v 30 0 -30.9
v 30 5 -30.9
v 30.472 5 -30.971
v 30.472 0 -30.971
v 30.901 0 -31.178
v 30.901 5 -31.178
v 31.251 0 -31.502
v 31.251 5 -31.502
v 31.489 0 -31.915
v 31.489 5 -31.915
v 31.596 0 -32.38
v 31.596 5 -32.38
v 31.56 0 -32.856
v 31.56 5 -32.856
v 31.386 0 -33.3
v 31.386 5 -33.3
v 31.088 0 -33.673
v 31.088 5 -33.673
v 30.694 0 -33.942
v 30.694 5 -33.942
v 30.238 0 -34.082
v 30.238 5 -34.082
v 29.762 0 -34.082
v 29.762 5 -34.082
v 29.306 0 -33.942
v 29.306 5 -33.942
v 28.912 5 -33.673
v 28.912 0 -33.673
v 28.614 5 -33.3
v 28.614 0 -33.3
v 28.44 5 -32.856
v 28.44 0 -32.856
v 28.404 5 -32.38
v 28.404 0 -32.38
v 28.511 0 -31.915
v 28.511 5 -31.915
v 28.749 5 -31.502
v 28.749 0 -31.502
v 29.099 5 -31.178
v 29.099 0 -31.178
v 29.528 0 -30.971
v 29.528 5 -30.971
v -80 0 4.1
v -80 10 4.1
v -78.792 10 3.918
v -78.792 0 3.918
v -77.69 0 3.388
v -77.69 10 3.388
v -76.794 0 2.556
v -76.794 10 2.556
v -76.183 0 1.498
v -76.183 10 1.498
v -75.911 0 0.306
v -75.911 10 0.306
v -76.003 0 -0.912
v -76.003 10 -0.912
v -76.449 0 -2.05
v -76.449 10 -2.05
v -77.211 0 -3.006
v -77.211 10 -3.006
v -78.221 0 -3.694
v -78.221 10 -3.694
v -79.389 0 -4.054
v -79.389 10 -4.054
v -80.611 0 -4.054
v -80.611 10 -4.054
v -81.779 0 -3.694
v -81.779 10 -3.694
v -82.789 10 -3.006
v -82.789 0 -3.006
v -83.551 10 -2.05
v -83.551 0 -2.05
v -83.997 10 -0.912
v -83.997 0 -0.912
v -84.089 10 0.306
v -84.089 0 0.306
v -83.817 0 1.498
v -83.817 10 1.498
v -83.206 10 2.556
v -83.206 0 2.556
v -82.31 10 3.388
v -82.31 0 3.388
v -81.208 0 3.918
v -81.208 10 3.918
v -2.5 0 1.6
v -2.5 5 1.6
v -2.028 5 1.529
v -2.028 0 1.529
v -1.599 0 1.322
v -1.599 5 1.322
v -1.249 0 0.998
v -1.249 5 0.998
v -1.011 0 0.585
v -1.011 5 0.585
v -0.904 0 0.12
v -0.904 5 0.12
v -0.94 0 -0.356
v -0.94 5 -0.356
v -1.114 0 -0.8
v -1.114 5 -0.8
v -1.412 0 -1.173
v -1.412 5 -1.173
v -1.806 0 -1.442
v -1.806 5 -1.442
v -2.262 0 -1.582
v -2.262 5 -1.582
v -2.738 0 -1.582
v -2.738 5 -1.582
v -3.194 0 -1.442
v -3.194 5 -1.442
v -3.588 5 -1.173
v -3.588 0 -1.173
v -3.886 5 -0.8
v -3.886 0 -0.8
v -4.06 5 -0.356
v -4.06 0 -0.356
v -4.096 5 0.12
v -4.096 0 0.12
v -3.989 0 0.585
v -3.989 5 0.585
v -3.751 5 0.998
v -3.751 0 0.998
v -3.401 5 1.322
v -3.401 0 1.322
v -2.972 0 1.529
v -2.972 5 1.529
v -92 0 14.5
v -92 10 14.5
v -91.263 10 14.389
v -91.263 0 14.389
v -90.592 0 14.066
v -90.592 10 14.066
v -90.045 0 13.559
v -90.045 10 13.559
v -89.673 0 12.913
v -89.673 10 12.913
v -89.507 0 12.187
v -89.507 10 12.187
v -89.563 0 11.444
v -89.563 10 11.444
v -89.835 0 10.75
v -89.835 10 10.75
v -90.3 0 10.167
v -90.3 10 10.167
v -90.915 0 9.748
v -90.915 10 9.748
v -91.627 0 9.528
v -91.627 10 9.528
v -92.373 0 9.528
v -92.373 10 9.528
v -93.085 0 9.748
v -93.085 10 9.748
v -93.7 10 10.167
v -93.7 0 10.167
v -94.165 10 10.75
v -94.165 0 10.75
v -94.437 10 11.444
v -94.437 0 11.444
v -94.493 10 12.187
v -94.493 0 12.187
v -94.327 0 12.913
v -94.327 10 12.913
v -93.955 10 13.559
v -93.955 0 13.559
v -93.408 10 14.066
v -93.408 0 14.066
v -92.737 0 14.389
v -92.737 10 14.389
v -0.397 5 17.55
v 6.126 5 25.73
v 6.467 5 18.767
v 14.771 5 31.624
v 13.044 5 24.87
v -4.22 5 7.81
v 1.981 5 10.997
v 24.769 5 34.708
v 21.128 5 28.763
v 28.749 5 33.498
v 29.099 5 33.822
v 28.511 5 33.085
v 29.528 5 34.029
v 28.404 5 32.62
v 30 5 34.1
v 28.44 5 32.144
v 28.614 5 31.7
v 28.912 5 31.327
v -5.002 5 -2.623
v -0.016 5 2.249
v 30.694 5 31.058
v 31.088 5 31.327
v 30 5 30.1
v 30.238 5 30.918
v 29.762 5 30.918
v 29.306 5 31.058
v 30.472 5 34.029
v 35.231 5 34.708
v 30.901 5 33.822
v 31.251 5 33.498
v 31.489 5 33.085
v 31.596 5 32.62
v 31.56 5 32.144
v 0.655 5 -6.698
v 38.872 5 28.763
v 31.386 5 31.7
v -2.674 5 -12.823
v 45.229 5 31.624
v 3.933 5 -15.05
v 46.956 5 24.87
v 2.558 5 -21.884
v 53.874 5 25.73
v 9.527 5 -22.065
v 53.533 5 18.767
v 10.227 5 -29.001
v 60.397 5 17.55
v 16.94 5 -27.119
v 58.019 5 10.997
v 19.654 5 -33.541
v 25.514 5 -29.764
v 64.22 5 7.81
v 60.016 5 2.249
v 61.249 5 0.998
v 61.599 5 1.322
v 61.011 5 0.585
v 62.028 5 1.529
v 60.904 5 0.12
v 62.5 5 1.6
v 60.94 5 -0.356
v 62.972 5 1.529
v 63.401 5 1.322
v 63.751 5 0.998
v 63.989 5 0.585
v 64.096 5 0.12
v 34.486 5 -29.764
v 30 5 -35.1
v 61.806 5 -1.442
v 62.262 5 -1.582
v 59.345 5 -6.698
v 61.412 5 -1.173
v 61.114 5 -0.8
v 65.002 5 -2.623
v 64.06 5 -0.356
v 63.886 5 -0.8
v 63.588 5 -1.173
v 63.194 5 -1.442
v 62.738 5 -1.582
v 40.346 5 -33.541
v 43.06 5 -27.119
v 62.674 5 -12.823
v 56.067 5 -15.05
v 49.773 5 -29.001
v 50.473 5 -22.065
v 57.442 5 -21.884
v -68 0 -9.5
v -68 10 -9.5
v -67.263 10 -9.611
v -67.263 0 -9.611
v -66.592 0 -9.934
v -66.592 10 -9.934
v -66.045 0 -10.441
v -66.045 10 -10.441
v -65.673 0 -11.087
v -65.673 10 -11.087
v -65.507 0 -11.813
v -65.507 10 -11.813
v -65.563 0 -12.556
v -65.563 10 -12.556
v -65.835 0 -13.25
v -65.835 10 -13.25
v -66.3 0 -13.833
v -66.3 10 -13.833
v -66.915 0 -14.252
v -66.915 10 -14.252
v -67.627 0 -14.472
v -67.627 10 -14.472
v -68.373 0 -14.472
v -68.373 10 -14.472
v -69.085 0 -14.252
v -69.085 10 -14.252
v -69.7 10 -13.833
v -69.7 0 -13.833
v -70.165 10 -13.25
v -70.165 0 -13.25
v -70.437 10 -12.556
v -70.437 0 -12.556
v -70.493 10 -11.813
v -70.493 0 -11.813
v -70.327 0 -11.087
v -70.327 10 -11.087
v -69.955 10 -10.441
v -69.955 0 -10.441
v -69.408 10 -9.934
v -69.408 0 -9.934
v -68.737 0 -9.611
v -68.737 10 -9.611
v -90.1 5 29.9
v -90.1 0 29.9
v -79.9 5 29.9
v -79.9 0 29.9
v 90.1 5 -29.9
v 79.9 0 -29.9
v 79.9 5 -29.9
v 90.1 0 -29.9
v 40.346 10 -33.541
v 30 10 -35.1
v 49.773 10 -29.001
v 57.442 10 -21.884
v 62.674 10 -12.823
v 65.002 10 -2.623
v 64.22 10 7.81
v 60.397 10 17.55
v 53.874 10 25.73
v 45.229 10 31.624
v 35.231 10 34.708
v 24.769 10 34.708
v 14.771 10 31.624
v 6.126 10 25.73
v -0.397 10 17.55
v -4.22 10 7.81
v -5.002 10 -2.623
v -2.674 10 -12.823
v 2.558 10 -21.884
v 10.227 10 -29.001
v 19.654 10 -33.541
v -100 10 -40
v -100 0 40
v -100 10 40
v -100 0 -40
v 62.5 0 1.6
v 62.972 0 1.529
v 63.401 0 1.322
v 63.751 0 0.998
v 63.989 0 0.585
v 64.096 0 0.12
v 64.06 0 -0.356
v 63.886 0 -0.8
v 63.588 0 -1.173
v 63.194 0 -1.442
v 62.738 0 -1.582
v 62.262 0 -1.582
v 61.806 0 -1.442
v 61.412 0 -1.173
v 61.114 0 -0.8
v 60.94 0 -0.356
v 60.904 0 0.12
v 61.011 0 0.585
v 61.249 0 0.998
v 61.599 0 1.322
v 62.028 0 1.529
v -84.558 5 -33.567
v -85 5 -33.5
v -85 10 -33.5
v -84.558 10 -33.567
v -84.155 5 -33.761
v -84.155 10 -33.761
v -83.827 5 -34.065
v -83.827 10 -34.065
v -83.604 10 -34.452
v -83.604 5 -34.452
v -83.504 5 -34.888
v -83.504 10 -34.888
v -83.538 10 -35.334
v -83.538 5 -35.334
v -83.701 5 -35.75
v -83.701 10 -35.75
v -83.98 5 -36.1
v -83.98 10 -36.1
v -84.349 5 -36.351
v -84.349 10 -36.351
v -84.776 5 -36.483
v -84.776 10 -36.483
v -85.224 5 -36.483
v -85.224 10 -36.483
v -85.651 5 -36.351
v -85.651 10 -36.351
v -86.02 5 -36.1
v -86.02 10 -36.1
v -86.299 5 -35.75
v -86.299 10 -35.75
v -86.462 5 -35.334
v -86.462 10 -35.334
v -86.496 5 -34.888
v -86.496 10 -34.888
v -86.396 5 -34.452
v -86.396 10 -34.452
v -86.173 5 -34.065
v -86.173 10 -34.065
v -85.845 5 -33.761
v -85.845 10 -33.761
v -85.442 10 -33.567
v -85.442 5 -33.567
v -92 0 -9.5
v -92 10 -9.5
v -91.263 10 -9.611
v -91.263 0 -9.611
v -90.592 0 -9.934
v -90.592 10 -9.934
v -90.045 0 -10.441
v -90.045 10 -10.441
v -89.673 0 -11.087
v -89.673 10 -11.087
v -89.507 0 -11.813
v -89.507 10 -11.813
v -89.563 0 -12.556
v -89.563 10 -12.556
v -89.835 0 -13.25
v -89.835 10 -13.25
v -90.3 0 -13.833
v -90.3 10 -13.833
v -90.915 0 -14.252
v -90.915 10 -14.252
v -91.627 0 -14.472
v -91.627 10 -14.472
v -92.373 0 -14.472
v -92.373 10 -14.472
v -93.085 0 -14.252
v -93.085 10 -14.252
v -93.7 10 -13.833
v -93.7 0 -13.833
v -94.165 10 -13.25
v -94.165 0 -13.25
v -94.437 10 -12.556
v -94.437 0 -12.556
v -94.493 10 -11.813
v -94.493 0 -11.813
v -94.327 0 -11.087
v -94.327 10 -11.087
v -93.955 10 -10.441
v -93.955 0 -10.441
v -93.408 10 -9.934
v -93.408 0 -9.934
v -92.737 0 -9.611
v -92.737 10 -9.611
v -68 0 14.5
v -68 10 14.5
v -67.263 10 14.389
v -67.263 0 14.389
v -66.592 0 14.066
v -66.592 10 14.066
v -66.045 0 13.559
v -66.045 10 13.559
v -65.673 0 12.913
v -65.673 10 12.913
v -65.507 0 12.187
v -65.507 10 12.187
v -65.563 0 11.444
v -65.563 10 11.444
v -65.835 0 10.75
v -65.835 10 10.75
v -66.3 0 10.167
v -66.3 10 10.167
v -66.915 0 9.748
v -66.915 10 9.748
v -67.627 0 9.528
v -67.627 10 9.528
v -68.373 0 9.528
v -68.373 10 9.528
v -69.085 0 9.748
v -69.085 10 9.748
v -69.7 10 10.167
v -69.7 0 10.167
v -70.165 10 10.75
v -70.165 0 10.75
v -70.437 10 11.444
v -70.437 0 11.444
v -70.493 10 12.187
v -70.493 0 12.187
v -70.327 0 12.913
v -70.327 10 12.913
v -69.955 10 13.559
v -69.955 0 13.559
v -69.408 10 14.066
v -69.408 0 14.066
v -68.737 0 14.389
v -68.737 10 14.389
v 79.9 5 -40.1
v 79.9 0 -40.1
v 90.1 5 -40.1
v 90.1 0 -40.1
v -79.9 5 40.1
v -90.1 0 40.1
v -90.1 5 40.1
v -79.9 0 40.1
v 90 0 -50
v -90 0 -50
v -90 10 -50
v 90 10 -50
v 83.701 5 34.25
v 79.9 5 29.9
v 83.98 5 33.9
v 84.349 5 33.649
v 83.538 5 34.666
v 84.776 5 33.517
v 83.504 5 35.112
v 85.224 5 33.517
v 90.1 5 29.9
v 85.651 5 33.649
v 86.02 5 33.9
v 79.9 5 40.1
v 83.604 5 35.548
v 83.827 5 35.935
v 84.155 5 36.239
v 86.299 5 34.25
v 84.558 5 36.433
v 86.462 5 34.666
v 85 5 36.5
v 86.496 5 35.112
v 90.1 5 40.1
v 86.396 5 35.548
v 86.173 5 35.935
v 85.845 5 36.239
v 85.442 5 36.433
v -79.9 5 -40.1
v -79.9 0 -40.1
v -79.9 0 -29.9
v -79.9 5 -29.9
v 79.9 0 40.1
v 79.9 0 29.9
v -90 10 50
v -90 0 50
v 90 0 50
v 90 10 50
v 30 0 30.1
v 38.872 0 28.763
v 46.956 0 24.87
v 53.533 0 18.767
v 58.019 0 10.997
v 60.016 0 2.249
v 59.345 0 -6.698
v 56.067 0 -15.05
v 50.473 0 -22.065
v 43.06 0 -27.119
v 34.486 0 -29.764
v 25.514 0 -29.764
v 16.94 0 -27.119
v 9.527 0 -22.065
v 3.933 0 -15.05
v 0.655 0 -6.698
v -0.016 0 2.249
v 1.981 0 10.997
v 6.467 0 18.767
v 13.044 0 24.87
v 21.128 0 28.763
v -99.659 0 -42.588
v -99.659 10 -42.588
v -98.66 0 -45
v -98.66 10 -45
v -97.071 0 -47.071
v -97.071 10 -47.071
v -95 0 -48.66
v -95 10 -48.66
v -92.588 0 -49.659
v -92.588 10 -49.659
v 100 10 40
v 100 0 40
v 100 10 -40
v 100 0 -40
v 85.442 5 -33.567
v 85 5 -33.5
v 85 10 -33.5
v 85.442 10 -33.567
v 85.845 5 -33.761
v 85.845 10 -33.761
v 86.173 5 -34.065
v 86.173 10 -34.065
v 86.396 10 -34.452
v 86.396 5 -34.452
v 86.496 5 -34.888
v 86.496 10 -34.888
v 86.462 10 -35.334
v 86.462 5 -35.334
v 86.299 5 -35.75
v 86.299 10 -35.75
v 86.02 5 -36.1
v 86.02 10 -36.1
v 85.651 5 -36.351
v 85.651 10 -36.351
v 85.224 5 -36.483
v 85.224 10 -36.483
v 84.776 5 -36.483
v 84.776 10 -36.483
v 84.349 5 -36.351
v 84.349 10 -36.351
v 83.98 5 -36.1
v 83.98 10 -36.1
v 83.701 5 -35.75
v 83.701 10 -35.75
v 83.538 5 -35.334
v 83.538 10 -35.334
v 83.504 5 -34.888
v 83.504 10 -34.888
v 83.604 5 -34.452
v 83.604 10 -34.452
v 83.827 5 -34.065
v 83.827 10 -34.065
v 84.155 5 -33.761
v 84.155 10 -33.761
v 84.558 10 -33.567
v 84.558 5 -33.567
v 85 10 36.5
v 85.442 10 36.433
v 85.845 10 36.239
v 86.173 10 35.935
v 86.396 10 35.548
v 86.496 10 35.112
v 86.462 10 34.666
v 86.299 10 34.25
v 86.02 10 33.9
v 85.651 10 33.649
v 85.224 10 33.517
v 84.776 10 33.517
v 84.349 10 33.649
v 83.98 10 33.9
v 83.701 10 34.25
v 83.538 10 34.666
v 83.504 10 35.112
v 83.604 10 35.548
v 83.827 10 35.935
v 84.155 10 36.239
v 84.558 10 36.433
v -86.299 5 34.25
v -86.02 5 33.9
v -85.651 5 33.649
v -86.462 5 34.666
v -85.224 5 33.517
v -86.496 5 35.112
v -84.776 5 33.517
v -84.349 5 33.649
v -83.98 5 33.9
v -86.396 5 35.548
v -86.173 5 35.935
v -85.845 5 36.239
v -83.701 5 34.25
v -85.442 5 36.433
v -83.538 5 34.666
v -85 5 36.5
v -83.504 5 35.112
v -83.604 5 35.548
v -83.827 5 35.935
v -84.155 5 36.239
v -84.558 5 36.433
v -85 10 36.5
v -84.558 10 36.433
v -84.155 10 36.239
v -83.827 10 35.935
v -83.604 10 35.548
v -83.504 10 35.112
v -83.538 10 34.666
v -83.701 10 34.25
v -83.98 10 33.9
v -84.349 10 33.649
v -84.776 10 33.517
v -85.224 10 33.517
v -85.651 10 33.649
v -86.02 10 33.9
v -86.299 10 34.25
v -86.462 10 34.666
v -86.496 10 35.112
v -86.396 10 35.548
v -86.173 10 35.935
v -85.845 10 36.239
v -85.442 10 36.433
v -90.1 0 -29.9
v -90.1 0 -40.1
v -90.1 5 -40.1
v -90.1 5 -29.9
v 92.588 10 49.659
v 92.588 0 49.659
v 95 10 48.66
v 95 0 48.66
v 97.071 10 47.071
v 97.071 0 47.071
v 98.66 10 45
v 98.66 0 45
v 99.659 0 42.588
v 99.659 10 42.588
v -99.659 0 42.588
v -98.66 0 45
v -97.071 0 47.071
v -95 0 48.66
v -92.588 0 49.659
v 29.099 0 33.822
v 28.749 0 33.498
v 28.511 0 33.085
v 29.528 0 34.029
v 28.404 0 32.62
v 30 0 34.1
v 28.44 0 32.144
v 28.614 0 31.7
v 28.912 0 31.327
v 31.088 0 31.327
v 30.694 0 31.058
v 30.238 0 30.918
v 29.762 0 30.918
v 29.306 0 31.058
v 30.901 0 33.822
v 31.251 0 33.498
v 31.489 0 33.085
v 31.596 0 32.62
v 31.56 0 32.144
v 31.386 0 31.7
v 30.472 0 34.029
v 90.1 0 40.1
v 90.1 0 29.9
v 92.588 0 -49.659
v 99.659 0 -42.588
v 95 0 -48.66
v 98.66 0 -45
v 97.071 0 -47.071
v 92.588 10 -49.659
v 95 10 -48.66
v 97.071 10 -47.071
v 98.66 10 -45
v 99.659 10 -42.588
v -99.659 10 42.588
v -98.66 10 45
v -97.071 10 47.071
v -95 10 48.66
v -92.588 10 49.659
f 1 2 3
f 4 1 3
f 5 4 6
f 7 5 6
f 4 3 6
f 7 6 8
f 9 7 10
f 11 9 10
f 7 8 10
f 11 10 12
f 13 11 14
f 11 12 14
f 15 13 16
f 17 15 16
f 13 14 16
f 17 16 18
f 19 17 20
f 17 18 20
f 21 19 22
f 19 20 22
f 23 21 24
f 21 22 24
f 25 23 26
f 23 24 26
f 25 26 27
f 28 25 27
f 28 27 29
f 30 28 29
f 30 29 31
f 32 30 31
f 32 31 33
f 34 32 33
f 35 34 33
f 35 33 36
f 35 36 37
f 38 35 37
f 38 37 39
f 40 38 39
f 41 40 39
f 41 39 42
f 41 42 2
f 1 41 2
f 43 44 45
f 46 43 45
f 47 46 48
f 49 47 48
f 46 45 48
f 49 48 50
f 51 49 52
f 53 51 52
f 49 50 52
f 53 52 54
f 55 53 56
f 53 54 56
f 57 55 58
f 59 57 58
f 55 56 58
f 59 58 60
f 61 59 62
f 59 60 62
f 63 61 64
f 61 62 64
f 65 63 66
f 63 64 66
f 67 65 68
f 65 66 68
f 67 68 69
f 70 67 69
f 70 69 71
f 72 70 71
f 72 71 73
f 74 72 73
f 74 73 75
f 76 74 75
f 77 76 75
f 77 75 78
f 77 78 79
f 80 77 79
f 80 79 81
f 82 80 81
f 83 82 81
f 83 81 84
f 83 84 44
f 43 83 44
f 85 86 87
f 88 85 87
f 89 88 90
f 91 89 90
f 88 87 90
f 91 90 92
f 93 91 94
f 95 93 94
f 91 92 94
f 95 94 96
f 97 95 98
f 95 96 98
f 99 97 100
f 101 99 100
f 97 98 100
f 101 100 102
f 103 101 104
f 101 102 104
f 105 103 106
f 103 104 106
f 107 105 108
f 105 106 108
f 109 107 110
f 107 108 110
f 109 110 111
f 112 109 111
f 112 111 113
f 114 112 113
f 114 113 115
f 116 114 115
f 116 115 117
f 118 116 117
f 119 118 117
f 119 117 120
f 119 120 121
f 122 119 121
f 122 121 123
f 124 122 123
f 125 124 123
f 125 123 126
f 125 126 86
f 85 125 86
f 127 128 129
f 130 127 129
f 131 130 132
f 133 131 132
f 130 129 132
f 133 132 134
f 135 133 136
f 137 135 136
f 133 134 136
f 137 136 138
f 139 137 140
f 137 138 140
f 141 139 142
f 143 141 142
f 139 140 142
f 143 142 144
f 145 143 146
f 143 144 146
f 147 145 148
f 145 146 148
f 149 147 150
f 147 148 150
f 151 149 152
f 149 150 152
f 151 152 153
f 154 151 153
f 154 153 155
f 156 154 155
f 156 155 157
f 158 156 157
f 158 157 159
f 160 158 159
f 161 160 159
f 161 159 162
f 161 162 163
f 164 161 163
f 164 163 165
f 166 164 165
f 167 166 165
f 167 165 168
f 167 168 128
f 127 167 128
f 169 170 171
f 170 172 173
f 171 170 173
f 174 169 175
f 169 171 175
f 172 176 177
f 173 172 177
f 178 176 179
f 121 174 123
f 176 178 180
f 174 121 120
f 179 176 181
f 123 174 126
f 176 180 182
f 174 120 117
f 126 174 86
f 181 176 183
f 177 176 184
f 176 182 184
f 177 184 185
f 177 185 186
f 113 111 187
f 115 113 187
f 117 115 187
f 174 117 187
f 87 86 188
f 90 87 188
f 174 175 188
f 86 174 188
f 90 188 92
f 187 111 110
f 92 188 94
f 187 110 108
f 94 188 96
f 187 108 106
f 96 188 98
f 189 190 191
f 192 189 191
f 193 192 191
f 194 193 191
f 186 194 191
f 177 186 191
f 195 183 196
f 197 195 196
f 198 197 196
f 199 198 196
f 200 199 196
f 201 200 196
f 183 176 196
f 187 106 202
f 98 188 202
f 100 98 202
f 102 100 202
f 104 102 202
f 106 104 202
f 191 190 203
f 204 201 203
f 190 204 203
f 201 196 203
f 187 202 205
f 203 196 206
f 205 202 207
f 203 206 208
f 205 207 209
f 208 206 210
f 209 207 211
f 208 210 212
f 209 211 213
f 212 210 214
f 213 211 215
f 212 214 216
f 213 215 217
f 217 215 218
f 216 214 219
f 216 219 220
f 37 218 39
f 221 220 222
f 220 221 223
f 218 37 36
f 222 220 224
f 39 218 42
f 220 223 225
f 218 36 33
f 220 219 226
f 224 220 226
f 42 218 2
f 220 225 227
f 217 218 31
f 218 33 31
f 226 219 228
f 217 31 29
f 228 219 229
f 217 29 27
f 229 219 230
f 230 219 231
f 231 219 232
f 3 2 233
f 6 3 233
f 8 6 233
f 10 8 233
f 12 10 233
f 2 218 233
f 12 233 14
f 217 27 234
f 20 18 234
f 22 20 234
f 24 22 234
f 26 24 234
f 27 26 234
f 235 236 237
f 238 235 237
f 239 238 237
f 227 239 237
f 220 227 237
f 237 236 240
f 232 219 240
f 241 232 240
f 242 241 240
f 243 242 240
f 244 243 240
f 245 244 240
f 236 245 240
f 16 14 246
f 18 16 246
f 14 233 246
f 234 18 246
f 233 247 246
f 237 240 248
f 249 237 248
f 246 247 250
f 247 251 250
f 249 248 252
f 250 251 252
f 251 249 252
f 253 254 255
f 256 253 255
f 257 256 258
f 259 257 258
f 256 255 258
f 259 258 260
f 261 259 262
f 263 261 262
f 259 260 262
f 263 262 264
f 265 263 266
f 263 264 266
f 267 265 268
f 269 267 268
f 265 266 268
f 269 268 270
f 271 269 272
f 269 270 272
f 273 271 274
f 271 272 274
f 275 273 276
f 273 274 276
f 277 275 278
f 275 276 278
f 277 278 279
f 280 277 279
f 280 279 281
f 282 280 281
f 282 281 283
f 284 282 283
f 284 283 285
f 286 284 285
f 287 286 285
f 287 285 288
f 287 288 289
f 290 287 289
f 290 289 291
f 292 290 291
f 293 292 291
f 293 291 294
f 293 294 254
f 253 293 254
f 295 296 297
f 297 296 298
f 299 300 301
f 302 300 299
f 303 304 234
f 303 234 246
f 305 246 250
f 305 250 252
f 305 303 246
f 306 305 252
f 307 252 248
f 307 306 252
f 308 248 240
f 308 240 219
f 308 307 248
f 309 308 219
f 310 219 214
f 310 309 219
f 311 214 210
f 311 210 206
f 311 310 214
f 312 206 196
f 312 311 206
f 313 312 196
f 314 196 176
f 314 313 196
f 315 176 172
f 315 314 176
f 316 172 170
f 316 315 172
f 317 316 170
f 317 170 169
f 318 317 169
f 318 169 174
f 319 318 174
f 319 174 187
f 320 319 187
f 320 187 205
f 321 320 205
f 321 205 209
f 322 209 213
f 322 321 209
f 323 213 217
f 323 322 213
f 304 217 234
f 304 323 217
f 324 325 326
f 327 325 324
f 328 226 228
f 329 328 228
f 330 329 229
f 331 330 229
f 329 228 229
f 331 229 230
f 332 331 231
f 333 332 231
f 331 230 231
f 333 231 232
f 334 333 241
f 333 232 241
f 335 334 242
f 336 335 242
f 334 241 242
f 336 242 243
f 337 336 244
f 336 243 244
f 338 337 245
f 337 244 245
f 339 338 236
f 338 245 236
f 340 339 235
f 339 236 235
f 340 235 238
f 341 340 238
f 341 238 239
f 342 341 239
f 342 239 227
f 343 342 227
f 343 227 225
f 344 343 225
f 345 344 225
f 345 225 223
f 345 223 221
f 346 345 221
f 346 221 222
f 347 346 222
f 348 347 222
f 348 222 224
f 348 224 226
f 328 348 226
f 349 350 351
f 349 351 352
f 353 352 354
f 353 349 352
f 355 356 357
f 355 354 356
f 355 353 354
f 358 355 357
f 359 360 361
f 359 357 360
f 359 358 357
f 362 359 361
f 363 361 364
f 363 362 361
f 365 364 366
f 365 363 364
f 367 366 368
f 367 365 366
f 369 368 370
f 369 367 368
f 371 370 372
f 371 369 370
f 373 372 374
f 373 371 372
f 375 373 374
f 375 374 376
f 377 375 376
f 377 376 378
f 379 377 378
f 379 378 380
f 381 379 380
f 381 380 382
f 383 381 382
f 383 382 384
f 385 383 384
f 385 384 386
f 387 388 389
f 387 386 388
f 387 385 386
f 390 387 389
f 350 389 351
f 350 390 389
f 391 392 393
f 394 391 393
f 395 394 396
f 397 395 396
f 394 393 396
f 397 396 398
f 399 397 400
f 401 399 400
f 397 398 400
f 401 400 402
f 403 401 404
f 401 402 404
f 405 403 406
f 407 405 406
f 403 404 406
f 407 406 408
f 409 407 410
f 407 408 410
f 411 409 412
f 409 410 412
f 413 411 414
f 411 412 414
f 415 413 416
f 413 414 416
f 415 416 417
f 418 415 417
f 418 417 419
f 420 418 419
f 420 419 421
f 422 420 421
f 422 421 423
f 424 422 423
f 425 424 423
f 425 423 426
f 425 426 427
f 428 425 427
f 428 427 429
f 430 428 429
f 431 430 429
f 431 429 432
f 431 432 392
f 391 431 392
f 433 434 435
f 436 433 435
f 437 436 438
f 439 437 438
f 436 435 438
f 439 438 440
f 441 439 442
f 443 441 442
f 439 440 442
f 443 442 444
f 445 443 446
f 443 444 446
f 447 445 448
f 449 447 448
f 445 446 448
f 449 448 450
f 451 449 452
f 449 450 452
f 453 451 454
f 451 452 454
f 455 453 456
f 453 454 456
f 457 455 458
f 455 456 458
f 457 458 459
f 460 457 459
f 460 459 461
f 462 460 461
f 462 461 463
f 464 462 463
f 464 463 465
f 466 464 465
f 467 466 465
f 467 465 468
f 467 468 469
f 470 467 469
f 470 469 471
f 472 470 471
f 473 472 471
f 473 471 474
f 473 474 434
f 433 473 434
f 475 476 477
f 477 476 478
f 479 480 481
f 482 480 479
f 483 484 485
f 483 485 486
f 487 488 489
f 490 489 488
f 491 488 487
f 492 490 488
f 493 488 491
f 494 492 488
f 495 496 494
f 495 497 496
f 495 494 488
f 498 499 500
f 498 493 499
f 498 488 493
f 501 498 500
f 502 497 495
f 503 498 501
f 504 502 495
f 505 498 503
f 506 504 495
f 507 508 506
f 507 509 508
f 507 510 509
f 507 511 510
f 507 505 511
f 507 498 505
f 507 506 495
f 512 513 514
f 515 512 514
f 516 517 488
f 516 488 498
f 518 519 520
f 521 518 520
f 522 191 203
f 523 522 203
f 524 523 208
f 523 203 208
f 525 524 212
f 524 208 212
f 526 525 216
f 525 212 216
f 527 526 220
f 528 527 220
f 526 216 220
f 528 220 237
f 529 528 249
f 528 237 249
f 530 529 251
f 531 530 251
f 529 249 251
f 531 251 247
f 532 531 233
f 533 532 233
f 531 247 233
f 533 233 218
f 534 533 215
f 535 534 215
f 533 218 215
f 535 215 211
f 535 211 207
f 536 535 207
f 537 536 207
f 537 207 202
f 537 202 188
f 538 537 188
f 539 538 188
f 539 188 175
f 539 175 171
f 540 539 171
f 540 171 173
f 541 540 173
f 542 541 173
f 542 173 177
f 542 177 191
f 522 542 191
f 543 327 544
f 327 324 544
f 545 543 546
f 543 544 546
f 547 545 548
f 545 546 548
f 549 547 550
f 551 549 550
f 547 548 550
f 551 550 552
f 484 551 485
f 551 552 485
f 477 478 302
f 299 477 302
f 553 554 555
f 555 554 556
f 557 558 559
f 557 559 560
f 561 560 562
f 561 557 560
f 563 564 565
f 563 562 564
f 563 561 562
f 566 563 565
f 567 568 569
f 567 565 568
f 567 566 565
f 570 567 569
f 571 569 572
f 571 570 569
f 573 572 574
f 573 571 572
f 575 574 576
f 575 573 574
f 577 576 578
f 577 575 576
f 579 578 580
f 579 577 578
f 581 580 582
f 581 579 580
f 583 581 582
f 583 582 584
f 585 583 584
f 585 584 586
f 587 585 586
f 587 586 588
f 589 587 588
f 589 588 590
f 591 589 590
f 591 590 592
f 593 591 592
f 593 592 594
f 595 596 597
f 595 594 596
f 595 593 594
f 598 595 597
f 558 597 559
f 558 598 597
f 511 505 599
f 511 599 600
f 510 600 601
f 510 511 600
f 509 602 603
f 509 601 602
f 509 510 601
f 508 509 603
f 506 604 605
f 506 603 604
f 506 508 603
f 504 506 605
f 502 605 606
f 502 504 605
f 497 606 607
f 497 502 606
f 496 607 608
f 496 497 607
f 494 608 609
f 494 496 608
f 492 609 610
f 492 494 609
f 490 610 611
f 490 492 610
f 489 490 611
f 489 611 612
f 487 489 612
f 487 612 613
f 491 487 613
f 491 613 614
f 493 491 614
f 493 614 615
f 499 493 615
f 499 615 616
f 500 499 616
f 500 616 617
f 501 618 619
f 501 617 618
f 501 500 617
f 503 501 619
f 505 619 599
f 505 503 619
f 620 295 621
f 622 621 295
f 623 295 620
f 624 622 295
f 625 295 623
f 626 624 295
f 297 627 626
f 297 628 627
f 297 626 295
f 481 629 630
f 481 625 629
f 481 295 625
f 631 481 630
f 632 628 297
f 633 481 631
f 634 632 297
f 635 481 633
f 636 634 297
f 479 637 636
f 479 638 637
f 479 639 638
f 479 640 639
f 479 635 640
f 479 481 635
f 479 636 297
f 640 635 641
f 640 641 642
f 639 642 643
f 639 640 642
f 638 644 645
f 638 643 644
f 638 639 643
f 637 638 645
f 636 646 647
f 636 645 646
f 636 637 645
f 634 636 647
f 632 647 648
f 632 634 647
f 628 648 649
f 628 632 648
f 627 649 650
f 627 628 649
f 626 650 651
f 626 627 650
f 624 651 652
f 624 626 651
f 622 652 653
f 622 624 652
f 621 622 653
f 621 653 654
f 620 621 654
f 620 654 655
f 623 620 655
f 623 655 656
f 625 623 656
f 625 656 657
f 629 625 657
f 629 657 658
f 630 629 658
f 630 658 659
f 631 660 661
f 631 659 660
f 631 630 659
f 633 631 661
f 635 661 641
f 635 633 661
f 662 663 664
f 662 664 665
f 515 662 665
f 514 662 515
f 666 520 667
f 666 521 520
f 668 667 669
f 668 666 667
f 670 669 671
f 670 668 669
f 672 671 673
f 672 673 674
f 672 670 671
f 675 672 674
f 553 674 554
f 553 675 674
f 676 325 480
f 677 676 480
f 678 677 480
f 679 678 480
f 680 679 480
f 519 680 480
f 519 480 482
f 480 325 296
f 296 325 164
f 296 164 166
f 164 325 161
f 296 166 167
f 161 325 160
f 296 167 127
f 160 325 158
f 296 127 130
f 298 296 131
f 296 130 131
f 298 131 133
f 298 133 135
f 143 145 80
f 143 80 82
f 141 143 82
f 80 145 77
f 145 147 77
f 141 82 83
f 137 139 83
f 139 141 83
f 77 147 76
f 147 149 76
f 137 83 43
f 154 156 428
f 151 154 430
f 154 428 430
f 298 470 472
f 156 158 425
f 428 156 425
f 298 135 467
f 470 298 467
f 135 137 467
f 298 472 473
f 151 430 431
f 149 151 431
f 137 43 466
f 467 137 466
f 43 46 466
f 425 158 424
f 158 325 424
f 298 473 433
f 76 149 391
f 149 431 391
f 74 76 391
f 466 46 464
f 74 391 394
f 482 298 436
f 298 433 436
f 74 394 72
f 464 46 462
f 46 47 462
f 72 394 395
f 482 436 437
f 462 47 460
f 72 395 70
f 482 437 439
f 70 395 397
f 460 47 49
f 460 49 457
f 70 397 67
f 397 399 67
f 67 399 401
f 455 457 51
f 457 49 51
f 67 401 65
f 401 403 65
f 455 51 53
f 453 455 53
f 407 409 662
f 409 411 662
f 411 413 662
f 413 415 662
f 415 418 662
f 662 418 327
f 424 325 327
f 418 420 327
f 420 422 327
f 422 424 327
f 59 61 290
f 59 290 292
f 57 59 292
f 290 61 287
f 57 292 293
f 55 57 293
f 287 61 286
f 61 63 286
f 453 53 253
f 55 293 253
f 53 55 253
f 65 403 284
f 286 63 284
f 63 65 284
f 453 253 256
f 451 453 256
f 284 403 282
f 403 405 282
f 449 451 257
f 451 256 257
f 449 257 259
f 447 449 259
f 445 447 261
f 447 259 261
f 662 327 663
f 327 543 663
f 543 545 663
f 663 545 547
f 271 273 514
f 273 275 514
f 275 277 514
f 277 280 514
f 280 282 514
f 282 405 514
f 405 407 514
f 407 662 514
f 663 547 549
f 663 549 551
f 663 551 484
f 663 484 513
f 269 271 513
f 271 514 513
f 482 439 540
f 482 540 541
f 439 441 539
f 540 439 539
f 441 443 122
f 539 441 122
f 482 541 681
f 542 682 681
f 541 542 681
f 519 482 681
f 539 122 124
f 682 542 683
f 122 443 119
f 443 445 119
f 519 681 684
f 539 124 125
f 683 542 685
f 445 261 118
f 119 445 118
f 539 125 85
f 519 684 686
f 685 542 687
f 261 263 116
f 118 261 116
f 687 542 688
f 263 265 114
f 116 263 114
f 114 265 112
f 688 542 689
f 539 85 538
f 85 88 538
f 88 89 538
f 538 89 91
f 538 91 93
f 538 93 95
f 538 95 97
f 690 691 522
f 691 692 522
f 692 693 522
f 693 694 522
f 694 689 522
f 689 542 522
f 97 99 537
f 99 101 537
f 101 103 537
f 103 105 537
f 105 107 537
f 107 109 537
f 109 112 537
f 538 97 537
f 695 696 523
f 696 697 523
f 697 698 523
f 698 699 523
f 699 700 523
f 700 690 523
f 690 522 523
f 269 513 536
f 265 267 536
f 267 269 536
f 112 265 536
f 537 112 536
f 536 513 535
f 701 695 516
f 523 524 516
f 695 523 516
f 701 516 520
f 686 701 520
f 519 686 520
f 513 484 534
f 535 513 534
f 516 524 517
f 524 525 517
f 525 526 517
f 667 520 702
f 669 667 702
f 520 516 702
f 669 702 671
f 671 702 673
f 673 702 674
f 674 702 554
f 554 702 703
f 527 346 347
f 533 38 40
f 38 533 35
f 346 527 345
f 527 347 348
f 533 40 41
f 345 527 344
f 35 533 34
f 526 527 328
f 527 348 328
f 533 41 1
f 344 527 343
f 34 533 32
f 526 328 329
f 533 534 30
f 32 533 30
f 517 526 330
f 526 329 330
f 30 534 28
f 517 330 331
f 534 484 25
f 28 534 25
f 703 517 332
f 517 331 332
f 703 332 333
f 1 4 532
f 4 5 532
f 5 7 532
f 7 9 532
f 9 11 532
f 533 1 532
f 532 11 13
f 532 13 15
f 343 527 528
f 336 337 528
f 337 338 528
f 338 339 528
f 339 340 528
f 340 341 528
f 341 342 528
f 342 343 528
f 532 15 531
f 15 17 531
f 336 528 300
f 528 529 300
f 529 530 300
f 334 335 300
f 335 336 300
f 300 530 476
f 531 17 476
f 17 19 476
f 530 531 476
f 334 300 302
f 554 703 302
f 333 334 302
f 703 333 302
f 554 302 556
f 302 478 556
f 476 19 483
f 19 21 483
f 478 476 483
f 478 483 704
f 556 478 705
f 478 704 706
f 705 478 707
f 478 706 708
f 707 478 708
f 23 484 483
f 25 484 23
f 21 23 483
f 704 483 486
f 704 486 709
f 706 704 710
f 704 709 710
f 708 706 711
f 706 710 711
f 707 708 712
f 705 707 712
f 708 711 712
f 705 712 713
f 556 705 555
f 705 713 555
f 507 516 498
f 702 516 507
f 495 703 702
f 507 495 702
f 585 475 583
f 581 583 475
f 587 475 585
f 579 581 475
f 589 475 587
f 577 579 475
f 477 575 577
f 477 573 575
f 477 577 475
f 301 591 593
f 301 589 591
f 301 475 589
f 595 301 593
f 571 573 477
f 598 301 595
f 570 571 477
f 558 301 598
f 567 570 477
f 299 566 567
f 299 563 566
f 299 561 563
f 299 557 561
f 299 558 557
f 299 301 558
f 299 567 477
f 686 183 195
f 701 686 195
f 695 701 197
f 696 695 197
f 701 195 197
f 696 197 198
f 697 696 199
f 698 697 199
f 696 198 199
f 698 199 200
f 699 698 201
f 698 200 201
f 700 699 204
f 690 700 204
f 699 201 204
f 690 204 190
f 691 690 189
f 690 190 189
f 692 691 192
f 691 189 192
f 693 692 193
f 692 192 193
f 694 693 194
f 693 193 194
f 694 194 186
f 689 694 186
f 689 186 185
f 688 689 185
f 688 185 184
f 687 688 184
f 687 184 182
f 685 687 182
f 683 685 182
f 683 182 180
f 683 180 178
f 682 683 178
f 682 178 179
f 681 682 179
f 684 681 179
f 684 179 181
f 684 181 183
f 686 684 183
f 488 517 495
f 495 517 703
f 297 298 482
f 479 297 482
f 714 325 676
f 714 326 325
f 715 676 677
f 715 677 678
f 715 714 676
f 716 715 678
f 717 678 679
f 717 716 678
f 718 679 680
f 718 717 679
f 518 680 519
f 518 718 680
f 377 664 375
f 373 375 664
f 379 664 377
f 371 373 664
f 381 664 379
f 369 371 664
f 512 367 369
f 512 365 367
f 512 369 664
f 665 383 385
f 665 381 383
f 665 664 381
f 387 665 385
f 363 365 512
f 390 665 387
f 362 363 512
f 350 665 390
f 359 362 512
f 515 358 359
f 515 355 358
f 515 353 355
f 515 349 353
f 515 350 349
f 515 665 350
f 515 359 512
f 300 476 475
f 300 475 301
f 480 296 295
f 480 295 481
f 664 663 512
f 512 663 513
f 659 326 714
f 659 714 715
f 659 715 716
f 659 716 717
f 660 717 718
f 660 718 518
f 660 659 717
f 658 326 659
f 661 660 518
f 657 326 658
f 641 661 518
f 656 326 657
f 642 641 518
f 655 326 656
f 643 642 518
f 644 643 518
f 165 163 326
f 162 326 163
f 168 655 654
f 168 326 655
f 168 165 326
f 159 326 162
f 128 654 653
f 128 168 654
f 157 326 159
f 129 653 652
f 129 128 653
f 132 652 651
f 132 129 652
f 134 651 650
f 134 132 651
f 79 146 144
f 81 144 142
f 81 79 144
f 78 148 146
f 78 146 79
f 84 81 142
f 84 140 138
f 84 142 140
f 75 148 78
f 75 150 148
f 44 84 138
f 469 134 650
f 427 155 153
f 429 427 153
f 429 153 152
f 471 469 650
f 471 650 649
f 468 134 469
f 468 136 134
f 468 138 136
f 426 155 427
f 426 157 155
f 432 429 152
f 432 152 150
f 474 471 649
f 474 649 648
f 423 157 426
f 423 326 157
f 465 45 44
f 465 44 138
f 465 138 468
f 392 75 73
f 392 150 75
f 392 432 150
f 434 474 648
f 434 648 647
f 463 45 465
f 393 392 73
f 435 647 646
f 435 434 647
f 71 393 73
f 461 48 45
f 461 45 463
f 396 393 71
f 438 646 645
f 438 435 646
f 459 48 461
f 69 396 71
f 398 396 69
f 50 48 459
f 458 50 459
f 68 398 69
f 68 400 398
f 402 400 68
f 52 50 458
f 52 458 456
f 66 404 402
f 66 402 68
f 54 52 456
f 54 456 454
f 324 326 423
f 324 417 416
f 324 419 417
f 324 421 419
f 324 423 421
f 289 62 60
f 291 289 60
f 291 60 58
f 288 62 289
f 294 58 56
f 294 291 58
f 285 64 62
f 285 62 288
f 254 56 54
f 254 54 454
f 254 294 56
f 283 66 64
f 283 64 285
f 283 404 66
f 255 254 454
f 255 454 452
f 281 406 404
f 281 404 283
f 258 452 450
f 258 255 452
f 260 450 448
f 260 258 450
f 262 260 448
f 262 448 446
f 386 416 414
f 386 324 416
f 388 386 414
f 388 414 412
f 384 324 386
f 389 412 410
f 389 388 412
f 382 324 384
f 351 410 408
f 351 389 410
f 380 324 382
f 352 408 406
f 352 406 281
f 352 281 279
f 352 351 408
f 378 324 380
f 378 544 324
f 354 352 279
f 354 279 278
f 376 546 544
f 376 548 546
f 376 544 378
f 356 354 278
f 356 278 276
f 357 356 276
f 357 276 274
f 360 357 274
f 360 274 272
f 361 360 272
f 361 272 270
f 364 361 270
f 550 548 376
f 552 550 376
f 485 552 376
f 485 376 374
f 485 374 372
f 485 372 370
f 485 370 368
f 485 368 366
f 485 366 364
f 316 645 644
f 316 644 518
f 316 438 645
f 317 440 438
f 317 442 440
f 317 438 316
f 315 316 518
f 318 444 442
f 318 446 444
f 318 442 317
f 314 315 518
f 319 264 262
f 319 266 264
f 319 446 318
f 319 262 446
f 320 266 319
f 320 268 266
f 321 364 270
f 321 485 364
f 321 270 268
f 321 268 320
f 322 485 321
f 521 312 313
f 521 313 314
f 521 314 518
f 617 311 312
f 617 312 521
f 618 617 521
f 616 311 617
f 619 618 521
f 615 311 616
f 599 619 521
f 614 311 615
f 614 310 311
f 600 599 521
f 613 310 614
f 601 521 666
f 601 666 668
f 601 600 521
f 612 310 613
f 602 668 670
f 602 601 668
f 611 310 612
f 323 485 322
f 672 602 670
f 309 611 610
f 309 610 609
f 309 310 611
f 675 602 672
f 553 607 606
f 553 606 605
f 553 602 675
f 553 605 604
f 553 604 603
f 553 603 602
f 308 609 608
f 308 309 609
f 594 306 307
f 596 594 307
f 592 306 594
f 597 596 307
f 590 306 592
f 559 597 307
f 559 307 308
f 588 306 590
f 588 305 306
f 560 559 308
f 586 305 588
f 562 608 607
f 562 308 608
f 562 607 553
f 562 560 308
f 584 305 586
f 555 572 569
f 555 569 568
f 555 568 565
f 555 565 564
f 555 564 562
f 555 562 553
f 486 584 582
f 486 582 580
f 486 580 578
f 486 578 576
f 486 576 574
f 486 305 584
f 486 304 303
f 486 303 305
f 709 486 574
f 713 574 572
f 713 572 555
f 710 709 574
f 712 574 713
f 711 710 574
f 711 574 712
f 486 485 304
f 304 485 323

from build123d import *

# Parameters (mm, degrees)
SKETCH_1_W          = 200
SKETCH_1_H          = 100
EXTRUDE_1_DEPTH     = 10
SKETCH_2_R          = 2.5
SKETCH_2_R_2        = 30.1
SKETCH_2_R_3        = 4.1
CUT_EXTRUDE_1_DEPTH = 113.249721603
SKETCH_3_R          = 35.1
CUT_EXTRUDE_2_DEPTH = 5
FILLET_1_R          = 10
SKETCH_4_W          = 10.2
SKETCH_4_H          = 10.2
CUT_EXTRUDE_4_DEPTH = 5
SKETCH_5_R          = 1.6
CUT_EXTRUDE_5_DEPTH = 112.915146428
SKETCH_6_R          = 1.5
CUT_EXTRUDE_7_DEPTH = 113.249721603


with BuildPart() as part:
    # ｽｹｯﾁ1 → ﾎﾞｽ - 押し出し1 (new body)
    with BuildSketch(Plane(origin=(0, 0, 0), x_dir=(1, 0, 0), z_dir=(0, 1, 0))):
        Rectangle(SKETCH_1_W, SKETCH_1_H)
    extrude(amount=EXTRUDE_1_DEPTH)

    # ｽｹｯﾁ2 → ｶｯﾄ - 押し出し1 (cut, through all)
    with BuildSketch(Plane(origin=(0, 10, 0), x_dir=(1, 0, 0), z_dir=(0, 1, 0))):
        with Locations((-92, 12)):
            Circle(SKETCH_2_R)
        with Locations((-68, 12)):
            Circle(SKETCH_2_R)
        with Locations((-92, -12)):
            Circle(SKETCH_2_R)
        with Locations((-68, -12)):
            Circle(SKETCH_2_R)
        with Locations((30, 0)):
            Circle(SKETCH_2_R_2)
        with Locations((-80, 0)):
            Circle(SKETCH_2_R_3)
    extrude(amount=-CUT_EXTRUDE_1_DEPTH, mode=Mode.SUBTRACT)

    # ｽｹｯﾁ3 → ｶｯﾄ - 押し出し2 (cut)
    with BuildSketch(Plane.XZ.offset(-10)):
        with Locations((30, 0)):
            Circle(SKETCH_3_R)
    extrude(amount=CUT_EXTRUDE_2_DEPTH, mode=Mode.SUBTRACT)

    # ﾌｨﾚｯﾄ1
    fillet_1_edges = [part.edges().sort_by_distance(p)[0] for p in [
        (100, 5, -50),
        (-100, 5, -50),
        (100, 5, 50),
        (-100, 5, 50),
    ]]
    fillet(fillet_1_edges, radius=FILLET_1_R)

    # ｽｹｯﾁ4 → ｶｯﾄ - 押し出し4 (cut)
    with BuildSketch(Plane.XZ):
        with Locations((-85, 35)):
            Rectangle(SKETCH_4_W, SKETCH_4_H)
        with Locations((-85, -35)):
            Rectangle(SKETCH_4_W, SKETCH_4_H)
        with Locations((85, 35)):
            Rectangle(SKETCH_4_W, SKETCH_4_H)
        with Locations((85, -35)):
            Rectangle(SKETCH_4_W, SKETCH_4_H)
    extrude(amount=-CUT_EXTRUDE_4_DEPTH, mode=Mode.SUBTRACT)

    # ｽｹｯﾁ5 → ｶｯﾄ - 押し出し5 (cut, through all)
    with BuildSketch(Plane(origin=(0, 5, 0), x_dir=(1, 0, 0), z_dir=(0, 1, 0))):
        with Locations((-2.5, 0)):
            Circle(SKETCH_5_R)
        with Locations((62.5, 0)):
            Circle(SKETCH_5_R)
        with Locations((30, 32.5)):
            Circle(SKETCH_5_R)
        with Locations((30, -32.5)):
            Circle(SKETCH_5_R)
    extrude(amount=-CUT_EXTRUDE_5_DEPTH, mode=Mode.SUBTRACT)

    # ｽｹｯﾁ6 → ｶｯﾄ - 押し出し7 (cut, through all)
    with BuildSketch(Plane(origin=(0, 0, 0), x_dir=(1, 0, 0), z_dir=(0, 1, 0))):
        with Locations((-85, -35)):
            Circle(SKETCH_6_R)
        with Locations((-85, 35)):
            Circle(SKETCH_6_R)
        with Locations((85, 35)):
            Circle(SKETCH_6_R)
        with Locations((85, -35)):
            Circle(SKETCH_6_R)
    extrude(amount=CUT_EXTRUDE_7_DEPTH, mode=Mode.SUBTRACT)


solid = part.part
